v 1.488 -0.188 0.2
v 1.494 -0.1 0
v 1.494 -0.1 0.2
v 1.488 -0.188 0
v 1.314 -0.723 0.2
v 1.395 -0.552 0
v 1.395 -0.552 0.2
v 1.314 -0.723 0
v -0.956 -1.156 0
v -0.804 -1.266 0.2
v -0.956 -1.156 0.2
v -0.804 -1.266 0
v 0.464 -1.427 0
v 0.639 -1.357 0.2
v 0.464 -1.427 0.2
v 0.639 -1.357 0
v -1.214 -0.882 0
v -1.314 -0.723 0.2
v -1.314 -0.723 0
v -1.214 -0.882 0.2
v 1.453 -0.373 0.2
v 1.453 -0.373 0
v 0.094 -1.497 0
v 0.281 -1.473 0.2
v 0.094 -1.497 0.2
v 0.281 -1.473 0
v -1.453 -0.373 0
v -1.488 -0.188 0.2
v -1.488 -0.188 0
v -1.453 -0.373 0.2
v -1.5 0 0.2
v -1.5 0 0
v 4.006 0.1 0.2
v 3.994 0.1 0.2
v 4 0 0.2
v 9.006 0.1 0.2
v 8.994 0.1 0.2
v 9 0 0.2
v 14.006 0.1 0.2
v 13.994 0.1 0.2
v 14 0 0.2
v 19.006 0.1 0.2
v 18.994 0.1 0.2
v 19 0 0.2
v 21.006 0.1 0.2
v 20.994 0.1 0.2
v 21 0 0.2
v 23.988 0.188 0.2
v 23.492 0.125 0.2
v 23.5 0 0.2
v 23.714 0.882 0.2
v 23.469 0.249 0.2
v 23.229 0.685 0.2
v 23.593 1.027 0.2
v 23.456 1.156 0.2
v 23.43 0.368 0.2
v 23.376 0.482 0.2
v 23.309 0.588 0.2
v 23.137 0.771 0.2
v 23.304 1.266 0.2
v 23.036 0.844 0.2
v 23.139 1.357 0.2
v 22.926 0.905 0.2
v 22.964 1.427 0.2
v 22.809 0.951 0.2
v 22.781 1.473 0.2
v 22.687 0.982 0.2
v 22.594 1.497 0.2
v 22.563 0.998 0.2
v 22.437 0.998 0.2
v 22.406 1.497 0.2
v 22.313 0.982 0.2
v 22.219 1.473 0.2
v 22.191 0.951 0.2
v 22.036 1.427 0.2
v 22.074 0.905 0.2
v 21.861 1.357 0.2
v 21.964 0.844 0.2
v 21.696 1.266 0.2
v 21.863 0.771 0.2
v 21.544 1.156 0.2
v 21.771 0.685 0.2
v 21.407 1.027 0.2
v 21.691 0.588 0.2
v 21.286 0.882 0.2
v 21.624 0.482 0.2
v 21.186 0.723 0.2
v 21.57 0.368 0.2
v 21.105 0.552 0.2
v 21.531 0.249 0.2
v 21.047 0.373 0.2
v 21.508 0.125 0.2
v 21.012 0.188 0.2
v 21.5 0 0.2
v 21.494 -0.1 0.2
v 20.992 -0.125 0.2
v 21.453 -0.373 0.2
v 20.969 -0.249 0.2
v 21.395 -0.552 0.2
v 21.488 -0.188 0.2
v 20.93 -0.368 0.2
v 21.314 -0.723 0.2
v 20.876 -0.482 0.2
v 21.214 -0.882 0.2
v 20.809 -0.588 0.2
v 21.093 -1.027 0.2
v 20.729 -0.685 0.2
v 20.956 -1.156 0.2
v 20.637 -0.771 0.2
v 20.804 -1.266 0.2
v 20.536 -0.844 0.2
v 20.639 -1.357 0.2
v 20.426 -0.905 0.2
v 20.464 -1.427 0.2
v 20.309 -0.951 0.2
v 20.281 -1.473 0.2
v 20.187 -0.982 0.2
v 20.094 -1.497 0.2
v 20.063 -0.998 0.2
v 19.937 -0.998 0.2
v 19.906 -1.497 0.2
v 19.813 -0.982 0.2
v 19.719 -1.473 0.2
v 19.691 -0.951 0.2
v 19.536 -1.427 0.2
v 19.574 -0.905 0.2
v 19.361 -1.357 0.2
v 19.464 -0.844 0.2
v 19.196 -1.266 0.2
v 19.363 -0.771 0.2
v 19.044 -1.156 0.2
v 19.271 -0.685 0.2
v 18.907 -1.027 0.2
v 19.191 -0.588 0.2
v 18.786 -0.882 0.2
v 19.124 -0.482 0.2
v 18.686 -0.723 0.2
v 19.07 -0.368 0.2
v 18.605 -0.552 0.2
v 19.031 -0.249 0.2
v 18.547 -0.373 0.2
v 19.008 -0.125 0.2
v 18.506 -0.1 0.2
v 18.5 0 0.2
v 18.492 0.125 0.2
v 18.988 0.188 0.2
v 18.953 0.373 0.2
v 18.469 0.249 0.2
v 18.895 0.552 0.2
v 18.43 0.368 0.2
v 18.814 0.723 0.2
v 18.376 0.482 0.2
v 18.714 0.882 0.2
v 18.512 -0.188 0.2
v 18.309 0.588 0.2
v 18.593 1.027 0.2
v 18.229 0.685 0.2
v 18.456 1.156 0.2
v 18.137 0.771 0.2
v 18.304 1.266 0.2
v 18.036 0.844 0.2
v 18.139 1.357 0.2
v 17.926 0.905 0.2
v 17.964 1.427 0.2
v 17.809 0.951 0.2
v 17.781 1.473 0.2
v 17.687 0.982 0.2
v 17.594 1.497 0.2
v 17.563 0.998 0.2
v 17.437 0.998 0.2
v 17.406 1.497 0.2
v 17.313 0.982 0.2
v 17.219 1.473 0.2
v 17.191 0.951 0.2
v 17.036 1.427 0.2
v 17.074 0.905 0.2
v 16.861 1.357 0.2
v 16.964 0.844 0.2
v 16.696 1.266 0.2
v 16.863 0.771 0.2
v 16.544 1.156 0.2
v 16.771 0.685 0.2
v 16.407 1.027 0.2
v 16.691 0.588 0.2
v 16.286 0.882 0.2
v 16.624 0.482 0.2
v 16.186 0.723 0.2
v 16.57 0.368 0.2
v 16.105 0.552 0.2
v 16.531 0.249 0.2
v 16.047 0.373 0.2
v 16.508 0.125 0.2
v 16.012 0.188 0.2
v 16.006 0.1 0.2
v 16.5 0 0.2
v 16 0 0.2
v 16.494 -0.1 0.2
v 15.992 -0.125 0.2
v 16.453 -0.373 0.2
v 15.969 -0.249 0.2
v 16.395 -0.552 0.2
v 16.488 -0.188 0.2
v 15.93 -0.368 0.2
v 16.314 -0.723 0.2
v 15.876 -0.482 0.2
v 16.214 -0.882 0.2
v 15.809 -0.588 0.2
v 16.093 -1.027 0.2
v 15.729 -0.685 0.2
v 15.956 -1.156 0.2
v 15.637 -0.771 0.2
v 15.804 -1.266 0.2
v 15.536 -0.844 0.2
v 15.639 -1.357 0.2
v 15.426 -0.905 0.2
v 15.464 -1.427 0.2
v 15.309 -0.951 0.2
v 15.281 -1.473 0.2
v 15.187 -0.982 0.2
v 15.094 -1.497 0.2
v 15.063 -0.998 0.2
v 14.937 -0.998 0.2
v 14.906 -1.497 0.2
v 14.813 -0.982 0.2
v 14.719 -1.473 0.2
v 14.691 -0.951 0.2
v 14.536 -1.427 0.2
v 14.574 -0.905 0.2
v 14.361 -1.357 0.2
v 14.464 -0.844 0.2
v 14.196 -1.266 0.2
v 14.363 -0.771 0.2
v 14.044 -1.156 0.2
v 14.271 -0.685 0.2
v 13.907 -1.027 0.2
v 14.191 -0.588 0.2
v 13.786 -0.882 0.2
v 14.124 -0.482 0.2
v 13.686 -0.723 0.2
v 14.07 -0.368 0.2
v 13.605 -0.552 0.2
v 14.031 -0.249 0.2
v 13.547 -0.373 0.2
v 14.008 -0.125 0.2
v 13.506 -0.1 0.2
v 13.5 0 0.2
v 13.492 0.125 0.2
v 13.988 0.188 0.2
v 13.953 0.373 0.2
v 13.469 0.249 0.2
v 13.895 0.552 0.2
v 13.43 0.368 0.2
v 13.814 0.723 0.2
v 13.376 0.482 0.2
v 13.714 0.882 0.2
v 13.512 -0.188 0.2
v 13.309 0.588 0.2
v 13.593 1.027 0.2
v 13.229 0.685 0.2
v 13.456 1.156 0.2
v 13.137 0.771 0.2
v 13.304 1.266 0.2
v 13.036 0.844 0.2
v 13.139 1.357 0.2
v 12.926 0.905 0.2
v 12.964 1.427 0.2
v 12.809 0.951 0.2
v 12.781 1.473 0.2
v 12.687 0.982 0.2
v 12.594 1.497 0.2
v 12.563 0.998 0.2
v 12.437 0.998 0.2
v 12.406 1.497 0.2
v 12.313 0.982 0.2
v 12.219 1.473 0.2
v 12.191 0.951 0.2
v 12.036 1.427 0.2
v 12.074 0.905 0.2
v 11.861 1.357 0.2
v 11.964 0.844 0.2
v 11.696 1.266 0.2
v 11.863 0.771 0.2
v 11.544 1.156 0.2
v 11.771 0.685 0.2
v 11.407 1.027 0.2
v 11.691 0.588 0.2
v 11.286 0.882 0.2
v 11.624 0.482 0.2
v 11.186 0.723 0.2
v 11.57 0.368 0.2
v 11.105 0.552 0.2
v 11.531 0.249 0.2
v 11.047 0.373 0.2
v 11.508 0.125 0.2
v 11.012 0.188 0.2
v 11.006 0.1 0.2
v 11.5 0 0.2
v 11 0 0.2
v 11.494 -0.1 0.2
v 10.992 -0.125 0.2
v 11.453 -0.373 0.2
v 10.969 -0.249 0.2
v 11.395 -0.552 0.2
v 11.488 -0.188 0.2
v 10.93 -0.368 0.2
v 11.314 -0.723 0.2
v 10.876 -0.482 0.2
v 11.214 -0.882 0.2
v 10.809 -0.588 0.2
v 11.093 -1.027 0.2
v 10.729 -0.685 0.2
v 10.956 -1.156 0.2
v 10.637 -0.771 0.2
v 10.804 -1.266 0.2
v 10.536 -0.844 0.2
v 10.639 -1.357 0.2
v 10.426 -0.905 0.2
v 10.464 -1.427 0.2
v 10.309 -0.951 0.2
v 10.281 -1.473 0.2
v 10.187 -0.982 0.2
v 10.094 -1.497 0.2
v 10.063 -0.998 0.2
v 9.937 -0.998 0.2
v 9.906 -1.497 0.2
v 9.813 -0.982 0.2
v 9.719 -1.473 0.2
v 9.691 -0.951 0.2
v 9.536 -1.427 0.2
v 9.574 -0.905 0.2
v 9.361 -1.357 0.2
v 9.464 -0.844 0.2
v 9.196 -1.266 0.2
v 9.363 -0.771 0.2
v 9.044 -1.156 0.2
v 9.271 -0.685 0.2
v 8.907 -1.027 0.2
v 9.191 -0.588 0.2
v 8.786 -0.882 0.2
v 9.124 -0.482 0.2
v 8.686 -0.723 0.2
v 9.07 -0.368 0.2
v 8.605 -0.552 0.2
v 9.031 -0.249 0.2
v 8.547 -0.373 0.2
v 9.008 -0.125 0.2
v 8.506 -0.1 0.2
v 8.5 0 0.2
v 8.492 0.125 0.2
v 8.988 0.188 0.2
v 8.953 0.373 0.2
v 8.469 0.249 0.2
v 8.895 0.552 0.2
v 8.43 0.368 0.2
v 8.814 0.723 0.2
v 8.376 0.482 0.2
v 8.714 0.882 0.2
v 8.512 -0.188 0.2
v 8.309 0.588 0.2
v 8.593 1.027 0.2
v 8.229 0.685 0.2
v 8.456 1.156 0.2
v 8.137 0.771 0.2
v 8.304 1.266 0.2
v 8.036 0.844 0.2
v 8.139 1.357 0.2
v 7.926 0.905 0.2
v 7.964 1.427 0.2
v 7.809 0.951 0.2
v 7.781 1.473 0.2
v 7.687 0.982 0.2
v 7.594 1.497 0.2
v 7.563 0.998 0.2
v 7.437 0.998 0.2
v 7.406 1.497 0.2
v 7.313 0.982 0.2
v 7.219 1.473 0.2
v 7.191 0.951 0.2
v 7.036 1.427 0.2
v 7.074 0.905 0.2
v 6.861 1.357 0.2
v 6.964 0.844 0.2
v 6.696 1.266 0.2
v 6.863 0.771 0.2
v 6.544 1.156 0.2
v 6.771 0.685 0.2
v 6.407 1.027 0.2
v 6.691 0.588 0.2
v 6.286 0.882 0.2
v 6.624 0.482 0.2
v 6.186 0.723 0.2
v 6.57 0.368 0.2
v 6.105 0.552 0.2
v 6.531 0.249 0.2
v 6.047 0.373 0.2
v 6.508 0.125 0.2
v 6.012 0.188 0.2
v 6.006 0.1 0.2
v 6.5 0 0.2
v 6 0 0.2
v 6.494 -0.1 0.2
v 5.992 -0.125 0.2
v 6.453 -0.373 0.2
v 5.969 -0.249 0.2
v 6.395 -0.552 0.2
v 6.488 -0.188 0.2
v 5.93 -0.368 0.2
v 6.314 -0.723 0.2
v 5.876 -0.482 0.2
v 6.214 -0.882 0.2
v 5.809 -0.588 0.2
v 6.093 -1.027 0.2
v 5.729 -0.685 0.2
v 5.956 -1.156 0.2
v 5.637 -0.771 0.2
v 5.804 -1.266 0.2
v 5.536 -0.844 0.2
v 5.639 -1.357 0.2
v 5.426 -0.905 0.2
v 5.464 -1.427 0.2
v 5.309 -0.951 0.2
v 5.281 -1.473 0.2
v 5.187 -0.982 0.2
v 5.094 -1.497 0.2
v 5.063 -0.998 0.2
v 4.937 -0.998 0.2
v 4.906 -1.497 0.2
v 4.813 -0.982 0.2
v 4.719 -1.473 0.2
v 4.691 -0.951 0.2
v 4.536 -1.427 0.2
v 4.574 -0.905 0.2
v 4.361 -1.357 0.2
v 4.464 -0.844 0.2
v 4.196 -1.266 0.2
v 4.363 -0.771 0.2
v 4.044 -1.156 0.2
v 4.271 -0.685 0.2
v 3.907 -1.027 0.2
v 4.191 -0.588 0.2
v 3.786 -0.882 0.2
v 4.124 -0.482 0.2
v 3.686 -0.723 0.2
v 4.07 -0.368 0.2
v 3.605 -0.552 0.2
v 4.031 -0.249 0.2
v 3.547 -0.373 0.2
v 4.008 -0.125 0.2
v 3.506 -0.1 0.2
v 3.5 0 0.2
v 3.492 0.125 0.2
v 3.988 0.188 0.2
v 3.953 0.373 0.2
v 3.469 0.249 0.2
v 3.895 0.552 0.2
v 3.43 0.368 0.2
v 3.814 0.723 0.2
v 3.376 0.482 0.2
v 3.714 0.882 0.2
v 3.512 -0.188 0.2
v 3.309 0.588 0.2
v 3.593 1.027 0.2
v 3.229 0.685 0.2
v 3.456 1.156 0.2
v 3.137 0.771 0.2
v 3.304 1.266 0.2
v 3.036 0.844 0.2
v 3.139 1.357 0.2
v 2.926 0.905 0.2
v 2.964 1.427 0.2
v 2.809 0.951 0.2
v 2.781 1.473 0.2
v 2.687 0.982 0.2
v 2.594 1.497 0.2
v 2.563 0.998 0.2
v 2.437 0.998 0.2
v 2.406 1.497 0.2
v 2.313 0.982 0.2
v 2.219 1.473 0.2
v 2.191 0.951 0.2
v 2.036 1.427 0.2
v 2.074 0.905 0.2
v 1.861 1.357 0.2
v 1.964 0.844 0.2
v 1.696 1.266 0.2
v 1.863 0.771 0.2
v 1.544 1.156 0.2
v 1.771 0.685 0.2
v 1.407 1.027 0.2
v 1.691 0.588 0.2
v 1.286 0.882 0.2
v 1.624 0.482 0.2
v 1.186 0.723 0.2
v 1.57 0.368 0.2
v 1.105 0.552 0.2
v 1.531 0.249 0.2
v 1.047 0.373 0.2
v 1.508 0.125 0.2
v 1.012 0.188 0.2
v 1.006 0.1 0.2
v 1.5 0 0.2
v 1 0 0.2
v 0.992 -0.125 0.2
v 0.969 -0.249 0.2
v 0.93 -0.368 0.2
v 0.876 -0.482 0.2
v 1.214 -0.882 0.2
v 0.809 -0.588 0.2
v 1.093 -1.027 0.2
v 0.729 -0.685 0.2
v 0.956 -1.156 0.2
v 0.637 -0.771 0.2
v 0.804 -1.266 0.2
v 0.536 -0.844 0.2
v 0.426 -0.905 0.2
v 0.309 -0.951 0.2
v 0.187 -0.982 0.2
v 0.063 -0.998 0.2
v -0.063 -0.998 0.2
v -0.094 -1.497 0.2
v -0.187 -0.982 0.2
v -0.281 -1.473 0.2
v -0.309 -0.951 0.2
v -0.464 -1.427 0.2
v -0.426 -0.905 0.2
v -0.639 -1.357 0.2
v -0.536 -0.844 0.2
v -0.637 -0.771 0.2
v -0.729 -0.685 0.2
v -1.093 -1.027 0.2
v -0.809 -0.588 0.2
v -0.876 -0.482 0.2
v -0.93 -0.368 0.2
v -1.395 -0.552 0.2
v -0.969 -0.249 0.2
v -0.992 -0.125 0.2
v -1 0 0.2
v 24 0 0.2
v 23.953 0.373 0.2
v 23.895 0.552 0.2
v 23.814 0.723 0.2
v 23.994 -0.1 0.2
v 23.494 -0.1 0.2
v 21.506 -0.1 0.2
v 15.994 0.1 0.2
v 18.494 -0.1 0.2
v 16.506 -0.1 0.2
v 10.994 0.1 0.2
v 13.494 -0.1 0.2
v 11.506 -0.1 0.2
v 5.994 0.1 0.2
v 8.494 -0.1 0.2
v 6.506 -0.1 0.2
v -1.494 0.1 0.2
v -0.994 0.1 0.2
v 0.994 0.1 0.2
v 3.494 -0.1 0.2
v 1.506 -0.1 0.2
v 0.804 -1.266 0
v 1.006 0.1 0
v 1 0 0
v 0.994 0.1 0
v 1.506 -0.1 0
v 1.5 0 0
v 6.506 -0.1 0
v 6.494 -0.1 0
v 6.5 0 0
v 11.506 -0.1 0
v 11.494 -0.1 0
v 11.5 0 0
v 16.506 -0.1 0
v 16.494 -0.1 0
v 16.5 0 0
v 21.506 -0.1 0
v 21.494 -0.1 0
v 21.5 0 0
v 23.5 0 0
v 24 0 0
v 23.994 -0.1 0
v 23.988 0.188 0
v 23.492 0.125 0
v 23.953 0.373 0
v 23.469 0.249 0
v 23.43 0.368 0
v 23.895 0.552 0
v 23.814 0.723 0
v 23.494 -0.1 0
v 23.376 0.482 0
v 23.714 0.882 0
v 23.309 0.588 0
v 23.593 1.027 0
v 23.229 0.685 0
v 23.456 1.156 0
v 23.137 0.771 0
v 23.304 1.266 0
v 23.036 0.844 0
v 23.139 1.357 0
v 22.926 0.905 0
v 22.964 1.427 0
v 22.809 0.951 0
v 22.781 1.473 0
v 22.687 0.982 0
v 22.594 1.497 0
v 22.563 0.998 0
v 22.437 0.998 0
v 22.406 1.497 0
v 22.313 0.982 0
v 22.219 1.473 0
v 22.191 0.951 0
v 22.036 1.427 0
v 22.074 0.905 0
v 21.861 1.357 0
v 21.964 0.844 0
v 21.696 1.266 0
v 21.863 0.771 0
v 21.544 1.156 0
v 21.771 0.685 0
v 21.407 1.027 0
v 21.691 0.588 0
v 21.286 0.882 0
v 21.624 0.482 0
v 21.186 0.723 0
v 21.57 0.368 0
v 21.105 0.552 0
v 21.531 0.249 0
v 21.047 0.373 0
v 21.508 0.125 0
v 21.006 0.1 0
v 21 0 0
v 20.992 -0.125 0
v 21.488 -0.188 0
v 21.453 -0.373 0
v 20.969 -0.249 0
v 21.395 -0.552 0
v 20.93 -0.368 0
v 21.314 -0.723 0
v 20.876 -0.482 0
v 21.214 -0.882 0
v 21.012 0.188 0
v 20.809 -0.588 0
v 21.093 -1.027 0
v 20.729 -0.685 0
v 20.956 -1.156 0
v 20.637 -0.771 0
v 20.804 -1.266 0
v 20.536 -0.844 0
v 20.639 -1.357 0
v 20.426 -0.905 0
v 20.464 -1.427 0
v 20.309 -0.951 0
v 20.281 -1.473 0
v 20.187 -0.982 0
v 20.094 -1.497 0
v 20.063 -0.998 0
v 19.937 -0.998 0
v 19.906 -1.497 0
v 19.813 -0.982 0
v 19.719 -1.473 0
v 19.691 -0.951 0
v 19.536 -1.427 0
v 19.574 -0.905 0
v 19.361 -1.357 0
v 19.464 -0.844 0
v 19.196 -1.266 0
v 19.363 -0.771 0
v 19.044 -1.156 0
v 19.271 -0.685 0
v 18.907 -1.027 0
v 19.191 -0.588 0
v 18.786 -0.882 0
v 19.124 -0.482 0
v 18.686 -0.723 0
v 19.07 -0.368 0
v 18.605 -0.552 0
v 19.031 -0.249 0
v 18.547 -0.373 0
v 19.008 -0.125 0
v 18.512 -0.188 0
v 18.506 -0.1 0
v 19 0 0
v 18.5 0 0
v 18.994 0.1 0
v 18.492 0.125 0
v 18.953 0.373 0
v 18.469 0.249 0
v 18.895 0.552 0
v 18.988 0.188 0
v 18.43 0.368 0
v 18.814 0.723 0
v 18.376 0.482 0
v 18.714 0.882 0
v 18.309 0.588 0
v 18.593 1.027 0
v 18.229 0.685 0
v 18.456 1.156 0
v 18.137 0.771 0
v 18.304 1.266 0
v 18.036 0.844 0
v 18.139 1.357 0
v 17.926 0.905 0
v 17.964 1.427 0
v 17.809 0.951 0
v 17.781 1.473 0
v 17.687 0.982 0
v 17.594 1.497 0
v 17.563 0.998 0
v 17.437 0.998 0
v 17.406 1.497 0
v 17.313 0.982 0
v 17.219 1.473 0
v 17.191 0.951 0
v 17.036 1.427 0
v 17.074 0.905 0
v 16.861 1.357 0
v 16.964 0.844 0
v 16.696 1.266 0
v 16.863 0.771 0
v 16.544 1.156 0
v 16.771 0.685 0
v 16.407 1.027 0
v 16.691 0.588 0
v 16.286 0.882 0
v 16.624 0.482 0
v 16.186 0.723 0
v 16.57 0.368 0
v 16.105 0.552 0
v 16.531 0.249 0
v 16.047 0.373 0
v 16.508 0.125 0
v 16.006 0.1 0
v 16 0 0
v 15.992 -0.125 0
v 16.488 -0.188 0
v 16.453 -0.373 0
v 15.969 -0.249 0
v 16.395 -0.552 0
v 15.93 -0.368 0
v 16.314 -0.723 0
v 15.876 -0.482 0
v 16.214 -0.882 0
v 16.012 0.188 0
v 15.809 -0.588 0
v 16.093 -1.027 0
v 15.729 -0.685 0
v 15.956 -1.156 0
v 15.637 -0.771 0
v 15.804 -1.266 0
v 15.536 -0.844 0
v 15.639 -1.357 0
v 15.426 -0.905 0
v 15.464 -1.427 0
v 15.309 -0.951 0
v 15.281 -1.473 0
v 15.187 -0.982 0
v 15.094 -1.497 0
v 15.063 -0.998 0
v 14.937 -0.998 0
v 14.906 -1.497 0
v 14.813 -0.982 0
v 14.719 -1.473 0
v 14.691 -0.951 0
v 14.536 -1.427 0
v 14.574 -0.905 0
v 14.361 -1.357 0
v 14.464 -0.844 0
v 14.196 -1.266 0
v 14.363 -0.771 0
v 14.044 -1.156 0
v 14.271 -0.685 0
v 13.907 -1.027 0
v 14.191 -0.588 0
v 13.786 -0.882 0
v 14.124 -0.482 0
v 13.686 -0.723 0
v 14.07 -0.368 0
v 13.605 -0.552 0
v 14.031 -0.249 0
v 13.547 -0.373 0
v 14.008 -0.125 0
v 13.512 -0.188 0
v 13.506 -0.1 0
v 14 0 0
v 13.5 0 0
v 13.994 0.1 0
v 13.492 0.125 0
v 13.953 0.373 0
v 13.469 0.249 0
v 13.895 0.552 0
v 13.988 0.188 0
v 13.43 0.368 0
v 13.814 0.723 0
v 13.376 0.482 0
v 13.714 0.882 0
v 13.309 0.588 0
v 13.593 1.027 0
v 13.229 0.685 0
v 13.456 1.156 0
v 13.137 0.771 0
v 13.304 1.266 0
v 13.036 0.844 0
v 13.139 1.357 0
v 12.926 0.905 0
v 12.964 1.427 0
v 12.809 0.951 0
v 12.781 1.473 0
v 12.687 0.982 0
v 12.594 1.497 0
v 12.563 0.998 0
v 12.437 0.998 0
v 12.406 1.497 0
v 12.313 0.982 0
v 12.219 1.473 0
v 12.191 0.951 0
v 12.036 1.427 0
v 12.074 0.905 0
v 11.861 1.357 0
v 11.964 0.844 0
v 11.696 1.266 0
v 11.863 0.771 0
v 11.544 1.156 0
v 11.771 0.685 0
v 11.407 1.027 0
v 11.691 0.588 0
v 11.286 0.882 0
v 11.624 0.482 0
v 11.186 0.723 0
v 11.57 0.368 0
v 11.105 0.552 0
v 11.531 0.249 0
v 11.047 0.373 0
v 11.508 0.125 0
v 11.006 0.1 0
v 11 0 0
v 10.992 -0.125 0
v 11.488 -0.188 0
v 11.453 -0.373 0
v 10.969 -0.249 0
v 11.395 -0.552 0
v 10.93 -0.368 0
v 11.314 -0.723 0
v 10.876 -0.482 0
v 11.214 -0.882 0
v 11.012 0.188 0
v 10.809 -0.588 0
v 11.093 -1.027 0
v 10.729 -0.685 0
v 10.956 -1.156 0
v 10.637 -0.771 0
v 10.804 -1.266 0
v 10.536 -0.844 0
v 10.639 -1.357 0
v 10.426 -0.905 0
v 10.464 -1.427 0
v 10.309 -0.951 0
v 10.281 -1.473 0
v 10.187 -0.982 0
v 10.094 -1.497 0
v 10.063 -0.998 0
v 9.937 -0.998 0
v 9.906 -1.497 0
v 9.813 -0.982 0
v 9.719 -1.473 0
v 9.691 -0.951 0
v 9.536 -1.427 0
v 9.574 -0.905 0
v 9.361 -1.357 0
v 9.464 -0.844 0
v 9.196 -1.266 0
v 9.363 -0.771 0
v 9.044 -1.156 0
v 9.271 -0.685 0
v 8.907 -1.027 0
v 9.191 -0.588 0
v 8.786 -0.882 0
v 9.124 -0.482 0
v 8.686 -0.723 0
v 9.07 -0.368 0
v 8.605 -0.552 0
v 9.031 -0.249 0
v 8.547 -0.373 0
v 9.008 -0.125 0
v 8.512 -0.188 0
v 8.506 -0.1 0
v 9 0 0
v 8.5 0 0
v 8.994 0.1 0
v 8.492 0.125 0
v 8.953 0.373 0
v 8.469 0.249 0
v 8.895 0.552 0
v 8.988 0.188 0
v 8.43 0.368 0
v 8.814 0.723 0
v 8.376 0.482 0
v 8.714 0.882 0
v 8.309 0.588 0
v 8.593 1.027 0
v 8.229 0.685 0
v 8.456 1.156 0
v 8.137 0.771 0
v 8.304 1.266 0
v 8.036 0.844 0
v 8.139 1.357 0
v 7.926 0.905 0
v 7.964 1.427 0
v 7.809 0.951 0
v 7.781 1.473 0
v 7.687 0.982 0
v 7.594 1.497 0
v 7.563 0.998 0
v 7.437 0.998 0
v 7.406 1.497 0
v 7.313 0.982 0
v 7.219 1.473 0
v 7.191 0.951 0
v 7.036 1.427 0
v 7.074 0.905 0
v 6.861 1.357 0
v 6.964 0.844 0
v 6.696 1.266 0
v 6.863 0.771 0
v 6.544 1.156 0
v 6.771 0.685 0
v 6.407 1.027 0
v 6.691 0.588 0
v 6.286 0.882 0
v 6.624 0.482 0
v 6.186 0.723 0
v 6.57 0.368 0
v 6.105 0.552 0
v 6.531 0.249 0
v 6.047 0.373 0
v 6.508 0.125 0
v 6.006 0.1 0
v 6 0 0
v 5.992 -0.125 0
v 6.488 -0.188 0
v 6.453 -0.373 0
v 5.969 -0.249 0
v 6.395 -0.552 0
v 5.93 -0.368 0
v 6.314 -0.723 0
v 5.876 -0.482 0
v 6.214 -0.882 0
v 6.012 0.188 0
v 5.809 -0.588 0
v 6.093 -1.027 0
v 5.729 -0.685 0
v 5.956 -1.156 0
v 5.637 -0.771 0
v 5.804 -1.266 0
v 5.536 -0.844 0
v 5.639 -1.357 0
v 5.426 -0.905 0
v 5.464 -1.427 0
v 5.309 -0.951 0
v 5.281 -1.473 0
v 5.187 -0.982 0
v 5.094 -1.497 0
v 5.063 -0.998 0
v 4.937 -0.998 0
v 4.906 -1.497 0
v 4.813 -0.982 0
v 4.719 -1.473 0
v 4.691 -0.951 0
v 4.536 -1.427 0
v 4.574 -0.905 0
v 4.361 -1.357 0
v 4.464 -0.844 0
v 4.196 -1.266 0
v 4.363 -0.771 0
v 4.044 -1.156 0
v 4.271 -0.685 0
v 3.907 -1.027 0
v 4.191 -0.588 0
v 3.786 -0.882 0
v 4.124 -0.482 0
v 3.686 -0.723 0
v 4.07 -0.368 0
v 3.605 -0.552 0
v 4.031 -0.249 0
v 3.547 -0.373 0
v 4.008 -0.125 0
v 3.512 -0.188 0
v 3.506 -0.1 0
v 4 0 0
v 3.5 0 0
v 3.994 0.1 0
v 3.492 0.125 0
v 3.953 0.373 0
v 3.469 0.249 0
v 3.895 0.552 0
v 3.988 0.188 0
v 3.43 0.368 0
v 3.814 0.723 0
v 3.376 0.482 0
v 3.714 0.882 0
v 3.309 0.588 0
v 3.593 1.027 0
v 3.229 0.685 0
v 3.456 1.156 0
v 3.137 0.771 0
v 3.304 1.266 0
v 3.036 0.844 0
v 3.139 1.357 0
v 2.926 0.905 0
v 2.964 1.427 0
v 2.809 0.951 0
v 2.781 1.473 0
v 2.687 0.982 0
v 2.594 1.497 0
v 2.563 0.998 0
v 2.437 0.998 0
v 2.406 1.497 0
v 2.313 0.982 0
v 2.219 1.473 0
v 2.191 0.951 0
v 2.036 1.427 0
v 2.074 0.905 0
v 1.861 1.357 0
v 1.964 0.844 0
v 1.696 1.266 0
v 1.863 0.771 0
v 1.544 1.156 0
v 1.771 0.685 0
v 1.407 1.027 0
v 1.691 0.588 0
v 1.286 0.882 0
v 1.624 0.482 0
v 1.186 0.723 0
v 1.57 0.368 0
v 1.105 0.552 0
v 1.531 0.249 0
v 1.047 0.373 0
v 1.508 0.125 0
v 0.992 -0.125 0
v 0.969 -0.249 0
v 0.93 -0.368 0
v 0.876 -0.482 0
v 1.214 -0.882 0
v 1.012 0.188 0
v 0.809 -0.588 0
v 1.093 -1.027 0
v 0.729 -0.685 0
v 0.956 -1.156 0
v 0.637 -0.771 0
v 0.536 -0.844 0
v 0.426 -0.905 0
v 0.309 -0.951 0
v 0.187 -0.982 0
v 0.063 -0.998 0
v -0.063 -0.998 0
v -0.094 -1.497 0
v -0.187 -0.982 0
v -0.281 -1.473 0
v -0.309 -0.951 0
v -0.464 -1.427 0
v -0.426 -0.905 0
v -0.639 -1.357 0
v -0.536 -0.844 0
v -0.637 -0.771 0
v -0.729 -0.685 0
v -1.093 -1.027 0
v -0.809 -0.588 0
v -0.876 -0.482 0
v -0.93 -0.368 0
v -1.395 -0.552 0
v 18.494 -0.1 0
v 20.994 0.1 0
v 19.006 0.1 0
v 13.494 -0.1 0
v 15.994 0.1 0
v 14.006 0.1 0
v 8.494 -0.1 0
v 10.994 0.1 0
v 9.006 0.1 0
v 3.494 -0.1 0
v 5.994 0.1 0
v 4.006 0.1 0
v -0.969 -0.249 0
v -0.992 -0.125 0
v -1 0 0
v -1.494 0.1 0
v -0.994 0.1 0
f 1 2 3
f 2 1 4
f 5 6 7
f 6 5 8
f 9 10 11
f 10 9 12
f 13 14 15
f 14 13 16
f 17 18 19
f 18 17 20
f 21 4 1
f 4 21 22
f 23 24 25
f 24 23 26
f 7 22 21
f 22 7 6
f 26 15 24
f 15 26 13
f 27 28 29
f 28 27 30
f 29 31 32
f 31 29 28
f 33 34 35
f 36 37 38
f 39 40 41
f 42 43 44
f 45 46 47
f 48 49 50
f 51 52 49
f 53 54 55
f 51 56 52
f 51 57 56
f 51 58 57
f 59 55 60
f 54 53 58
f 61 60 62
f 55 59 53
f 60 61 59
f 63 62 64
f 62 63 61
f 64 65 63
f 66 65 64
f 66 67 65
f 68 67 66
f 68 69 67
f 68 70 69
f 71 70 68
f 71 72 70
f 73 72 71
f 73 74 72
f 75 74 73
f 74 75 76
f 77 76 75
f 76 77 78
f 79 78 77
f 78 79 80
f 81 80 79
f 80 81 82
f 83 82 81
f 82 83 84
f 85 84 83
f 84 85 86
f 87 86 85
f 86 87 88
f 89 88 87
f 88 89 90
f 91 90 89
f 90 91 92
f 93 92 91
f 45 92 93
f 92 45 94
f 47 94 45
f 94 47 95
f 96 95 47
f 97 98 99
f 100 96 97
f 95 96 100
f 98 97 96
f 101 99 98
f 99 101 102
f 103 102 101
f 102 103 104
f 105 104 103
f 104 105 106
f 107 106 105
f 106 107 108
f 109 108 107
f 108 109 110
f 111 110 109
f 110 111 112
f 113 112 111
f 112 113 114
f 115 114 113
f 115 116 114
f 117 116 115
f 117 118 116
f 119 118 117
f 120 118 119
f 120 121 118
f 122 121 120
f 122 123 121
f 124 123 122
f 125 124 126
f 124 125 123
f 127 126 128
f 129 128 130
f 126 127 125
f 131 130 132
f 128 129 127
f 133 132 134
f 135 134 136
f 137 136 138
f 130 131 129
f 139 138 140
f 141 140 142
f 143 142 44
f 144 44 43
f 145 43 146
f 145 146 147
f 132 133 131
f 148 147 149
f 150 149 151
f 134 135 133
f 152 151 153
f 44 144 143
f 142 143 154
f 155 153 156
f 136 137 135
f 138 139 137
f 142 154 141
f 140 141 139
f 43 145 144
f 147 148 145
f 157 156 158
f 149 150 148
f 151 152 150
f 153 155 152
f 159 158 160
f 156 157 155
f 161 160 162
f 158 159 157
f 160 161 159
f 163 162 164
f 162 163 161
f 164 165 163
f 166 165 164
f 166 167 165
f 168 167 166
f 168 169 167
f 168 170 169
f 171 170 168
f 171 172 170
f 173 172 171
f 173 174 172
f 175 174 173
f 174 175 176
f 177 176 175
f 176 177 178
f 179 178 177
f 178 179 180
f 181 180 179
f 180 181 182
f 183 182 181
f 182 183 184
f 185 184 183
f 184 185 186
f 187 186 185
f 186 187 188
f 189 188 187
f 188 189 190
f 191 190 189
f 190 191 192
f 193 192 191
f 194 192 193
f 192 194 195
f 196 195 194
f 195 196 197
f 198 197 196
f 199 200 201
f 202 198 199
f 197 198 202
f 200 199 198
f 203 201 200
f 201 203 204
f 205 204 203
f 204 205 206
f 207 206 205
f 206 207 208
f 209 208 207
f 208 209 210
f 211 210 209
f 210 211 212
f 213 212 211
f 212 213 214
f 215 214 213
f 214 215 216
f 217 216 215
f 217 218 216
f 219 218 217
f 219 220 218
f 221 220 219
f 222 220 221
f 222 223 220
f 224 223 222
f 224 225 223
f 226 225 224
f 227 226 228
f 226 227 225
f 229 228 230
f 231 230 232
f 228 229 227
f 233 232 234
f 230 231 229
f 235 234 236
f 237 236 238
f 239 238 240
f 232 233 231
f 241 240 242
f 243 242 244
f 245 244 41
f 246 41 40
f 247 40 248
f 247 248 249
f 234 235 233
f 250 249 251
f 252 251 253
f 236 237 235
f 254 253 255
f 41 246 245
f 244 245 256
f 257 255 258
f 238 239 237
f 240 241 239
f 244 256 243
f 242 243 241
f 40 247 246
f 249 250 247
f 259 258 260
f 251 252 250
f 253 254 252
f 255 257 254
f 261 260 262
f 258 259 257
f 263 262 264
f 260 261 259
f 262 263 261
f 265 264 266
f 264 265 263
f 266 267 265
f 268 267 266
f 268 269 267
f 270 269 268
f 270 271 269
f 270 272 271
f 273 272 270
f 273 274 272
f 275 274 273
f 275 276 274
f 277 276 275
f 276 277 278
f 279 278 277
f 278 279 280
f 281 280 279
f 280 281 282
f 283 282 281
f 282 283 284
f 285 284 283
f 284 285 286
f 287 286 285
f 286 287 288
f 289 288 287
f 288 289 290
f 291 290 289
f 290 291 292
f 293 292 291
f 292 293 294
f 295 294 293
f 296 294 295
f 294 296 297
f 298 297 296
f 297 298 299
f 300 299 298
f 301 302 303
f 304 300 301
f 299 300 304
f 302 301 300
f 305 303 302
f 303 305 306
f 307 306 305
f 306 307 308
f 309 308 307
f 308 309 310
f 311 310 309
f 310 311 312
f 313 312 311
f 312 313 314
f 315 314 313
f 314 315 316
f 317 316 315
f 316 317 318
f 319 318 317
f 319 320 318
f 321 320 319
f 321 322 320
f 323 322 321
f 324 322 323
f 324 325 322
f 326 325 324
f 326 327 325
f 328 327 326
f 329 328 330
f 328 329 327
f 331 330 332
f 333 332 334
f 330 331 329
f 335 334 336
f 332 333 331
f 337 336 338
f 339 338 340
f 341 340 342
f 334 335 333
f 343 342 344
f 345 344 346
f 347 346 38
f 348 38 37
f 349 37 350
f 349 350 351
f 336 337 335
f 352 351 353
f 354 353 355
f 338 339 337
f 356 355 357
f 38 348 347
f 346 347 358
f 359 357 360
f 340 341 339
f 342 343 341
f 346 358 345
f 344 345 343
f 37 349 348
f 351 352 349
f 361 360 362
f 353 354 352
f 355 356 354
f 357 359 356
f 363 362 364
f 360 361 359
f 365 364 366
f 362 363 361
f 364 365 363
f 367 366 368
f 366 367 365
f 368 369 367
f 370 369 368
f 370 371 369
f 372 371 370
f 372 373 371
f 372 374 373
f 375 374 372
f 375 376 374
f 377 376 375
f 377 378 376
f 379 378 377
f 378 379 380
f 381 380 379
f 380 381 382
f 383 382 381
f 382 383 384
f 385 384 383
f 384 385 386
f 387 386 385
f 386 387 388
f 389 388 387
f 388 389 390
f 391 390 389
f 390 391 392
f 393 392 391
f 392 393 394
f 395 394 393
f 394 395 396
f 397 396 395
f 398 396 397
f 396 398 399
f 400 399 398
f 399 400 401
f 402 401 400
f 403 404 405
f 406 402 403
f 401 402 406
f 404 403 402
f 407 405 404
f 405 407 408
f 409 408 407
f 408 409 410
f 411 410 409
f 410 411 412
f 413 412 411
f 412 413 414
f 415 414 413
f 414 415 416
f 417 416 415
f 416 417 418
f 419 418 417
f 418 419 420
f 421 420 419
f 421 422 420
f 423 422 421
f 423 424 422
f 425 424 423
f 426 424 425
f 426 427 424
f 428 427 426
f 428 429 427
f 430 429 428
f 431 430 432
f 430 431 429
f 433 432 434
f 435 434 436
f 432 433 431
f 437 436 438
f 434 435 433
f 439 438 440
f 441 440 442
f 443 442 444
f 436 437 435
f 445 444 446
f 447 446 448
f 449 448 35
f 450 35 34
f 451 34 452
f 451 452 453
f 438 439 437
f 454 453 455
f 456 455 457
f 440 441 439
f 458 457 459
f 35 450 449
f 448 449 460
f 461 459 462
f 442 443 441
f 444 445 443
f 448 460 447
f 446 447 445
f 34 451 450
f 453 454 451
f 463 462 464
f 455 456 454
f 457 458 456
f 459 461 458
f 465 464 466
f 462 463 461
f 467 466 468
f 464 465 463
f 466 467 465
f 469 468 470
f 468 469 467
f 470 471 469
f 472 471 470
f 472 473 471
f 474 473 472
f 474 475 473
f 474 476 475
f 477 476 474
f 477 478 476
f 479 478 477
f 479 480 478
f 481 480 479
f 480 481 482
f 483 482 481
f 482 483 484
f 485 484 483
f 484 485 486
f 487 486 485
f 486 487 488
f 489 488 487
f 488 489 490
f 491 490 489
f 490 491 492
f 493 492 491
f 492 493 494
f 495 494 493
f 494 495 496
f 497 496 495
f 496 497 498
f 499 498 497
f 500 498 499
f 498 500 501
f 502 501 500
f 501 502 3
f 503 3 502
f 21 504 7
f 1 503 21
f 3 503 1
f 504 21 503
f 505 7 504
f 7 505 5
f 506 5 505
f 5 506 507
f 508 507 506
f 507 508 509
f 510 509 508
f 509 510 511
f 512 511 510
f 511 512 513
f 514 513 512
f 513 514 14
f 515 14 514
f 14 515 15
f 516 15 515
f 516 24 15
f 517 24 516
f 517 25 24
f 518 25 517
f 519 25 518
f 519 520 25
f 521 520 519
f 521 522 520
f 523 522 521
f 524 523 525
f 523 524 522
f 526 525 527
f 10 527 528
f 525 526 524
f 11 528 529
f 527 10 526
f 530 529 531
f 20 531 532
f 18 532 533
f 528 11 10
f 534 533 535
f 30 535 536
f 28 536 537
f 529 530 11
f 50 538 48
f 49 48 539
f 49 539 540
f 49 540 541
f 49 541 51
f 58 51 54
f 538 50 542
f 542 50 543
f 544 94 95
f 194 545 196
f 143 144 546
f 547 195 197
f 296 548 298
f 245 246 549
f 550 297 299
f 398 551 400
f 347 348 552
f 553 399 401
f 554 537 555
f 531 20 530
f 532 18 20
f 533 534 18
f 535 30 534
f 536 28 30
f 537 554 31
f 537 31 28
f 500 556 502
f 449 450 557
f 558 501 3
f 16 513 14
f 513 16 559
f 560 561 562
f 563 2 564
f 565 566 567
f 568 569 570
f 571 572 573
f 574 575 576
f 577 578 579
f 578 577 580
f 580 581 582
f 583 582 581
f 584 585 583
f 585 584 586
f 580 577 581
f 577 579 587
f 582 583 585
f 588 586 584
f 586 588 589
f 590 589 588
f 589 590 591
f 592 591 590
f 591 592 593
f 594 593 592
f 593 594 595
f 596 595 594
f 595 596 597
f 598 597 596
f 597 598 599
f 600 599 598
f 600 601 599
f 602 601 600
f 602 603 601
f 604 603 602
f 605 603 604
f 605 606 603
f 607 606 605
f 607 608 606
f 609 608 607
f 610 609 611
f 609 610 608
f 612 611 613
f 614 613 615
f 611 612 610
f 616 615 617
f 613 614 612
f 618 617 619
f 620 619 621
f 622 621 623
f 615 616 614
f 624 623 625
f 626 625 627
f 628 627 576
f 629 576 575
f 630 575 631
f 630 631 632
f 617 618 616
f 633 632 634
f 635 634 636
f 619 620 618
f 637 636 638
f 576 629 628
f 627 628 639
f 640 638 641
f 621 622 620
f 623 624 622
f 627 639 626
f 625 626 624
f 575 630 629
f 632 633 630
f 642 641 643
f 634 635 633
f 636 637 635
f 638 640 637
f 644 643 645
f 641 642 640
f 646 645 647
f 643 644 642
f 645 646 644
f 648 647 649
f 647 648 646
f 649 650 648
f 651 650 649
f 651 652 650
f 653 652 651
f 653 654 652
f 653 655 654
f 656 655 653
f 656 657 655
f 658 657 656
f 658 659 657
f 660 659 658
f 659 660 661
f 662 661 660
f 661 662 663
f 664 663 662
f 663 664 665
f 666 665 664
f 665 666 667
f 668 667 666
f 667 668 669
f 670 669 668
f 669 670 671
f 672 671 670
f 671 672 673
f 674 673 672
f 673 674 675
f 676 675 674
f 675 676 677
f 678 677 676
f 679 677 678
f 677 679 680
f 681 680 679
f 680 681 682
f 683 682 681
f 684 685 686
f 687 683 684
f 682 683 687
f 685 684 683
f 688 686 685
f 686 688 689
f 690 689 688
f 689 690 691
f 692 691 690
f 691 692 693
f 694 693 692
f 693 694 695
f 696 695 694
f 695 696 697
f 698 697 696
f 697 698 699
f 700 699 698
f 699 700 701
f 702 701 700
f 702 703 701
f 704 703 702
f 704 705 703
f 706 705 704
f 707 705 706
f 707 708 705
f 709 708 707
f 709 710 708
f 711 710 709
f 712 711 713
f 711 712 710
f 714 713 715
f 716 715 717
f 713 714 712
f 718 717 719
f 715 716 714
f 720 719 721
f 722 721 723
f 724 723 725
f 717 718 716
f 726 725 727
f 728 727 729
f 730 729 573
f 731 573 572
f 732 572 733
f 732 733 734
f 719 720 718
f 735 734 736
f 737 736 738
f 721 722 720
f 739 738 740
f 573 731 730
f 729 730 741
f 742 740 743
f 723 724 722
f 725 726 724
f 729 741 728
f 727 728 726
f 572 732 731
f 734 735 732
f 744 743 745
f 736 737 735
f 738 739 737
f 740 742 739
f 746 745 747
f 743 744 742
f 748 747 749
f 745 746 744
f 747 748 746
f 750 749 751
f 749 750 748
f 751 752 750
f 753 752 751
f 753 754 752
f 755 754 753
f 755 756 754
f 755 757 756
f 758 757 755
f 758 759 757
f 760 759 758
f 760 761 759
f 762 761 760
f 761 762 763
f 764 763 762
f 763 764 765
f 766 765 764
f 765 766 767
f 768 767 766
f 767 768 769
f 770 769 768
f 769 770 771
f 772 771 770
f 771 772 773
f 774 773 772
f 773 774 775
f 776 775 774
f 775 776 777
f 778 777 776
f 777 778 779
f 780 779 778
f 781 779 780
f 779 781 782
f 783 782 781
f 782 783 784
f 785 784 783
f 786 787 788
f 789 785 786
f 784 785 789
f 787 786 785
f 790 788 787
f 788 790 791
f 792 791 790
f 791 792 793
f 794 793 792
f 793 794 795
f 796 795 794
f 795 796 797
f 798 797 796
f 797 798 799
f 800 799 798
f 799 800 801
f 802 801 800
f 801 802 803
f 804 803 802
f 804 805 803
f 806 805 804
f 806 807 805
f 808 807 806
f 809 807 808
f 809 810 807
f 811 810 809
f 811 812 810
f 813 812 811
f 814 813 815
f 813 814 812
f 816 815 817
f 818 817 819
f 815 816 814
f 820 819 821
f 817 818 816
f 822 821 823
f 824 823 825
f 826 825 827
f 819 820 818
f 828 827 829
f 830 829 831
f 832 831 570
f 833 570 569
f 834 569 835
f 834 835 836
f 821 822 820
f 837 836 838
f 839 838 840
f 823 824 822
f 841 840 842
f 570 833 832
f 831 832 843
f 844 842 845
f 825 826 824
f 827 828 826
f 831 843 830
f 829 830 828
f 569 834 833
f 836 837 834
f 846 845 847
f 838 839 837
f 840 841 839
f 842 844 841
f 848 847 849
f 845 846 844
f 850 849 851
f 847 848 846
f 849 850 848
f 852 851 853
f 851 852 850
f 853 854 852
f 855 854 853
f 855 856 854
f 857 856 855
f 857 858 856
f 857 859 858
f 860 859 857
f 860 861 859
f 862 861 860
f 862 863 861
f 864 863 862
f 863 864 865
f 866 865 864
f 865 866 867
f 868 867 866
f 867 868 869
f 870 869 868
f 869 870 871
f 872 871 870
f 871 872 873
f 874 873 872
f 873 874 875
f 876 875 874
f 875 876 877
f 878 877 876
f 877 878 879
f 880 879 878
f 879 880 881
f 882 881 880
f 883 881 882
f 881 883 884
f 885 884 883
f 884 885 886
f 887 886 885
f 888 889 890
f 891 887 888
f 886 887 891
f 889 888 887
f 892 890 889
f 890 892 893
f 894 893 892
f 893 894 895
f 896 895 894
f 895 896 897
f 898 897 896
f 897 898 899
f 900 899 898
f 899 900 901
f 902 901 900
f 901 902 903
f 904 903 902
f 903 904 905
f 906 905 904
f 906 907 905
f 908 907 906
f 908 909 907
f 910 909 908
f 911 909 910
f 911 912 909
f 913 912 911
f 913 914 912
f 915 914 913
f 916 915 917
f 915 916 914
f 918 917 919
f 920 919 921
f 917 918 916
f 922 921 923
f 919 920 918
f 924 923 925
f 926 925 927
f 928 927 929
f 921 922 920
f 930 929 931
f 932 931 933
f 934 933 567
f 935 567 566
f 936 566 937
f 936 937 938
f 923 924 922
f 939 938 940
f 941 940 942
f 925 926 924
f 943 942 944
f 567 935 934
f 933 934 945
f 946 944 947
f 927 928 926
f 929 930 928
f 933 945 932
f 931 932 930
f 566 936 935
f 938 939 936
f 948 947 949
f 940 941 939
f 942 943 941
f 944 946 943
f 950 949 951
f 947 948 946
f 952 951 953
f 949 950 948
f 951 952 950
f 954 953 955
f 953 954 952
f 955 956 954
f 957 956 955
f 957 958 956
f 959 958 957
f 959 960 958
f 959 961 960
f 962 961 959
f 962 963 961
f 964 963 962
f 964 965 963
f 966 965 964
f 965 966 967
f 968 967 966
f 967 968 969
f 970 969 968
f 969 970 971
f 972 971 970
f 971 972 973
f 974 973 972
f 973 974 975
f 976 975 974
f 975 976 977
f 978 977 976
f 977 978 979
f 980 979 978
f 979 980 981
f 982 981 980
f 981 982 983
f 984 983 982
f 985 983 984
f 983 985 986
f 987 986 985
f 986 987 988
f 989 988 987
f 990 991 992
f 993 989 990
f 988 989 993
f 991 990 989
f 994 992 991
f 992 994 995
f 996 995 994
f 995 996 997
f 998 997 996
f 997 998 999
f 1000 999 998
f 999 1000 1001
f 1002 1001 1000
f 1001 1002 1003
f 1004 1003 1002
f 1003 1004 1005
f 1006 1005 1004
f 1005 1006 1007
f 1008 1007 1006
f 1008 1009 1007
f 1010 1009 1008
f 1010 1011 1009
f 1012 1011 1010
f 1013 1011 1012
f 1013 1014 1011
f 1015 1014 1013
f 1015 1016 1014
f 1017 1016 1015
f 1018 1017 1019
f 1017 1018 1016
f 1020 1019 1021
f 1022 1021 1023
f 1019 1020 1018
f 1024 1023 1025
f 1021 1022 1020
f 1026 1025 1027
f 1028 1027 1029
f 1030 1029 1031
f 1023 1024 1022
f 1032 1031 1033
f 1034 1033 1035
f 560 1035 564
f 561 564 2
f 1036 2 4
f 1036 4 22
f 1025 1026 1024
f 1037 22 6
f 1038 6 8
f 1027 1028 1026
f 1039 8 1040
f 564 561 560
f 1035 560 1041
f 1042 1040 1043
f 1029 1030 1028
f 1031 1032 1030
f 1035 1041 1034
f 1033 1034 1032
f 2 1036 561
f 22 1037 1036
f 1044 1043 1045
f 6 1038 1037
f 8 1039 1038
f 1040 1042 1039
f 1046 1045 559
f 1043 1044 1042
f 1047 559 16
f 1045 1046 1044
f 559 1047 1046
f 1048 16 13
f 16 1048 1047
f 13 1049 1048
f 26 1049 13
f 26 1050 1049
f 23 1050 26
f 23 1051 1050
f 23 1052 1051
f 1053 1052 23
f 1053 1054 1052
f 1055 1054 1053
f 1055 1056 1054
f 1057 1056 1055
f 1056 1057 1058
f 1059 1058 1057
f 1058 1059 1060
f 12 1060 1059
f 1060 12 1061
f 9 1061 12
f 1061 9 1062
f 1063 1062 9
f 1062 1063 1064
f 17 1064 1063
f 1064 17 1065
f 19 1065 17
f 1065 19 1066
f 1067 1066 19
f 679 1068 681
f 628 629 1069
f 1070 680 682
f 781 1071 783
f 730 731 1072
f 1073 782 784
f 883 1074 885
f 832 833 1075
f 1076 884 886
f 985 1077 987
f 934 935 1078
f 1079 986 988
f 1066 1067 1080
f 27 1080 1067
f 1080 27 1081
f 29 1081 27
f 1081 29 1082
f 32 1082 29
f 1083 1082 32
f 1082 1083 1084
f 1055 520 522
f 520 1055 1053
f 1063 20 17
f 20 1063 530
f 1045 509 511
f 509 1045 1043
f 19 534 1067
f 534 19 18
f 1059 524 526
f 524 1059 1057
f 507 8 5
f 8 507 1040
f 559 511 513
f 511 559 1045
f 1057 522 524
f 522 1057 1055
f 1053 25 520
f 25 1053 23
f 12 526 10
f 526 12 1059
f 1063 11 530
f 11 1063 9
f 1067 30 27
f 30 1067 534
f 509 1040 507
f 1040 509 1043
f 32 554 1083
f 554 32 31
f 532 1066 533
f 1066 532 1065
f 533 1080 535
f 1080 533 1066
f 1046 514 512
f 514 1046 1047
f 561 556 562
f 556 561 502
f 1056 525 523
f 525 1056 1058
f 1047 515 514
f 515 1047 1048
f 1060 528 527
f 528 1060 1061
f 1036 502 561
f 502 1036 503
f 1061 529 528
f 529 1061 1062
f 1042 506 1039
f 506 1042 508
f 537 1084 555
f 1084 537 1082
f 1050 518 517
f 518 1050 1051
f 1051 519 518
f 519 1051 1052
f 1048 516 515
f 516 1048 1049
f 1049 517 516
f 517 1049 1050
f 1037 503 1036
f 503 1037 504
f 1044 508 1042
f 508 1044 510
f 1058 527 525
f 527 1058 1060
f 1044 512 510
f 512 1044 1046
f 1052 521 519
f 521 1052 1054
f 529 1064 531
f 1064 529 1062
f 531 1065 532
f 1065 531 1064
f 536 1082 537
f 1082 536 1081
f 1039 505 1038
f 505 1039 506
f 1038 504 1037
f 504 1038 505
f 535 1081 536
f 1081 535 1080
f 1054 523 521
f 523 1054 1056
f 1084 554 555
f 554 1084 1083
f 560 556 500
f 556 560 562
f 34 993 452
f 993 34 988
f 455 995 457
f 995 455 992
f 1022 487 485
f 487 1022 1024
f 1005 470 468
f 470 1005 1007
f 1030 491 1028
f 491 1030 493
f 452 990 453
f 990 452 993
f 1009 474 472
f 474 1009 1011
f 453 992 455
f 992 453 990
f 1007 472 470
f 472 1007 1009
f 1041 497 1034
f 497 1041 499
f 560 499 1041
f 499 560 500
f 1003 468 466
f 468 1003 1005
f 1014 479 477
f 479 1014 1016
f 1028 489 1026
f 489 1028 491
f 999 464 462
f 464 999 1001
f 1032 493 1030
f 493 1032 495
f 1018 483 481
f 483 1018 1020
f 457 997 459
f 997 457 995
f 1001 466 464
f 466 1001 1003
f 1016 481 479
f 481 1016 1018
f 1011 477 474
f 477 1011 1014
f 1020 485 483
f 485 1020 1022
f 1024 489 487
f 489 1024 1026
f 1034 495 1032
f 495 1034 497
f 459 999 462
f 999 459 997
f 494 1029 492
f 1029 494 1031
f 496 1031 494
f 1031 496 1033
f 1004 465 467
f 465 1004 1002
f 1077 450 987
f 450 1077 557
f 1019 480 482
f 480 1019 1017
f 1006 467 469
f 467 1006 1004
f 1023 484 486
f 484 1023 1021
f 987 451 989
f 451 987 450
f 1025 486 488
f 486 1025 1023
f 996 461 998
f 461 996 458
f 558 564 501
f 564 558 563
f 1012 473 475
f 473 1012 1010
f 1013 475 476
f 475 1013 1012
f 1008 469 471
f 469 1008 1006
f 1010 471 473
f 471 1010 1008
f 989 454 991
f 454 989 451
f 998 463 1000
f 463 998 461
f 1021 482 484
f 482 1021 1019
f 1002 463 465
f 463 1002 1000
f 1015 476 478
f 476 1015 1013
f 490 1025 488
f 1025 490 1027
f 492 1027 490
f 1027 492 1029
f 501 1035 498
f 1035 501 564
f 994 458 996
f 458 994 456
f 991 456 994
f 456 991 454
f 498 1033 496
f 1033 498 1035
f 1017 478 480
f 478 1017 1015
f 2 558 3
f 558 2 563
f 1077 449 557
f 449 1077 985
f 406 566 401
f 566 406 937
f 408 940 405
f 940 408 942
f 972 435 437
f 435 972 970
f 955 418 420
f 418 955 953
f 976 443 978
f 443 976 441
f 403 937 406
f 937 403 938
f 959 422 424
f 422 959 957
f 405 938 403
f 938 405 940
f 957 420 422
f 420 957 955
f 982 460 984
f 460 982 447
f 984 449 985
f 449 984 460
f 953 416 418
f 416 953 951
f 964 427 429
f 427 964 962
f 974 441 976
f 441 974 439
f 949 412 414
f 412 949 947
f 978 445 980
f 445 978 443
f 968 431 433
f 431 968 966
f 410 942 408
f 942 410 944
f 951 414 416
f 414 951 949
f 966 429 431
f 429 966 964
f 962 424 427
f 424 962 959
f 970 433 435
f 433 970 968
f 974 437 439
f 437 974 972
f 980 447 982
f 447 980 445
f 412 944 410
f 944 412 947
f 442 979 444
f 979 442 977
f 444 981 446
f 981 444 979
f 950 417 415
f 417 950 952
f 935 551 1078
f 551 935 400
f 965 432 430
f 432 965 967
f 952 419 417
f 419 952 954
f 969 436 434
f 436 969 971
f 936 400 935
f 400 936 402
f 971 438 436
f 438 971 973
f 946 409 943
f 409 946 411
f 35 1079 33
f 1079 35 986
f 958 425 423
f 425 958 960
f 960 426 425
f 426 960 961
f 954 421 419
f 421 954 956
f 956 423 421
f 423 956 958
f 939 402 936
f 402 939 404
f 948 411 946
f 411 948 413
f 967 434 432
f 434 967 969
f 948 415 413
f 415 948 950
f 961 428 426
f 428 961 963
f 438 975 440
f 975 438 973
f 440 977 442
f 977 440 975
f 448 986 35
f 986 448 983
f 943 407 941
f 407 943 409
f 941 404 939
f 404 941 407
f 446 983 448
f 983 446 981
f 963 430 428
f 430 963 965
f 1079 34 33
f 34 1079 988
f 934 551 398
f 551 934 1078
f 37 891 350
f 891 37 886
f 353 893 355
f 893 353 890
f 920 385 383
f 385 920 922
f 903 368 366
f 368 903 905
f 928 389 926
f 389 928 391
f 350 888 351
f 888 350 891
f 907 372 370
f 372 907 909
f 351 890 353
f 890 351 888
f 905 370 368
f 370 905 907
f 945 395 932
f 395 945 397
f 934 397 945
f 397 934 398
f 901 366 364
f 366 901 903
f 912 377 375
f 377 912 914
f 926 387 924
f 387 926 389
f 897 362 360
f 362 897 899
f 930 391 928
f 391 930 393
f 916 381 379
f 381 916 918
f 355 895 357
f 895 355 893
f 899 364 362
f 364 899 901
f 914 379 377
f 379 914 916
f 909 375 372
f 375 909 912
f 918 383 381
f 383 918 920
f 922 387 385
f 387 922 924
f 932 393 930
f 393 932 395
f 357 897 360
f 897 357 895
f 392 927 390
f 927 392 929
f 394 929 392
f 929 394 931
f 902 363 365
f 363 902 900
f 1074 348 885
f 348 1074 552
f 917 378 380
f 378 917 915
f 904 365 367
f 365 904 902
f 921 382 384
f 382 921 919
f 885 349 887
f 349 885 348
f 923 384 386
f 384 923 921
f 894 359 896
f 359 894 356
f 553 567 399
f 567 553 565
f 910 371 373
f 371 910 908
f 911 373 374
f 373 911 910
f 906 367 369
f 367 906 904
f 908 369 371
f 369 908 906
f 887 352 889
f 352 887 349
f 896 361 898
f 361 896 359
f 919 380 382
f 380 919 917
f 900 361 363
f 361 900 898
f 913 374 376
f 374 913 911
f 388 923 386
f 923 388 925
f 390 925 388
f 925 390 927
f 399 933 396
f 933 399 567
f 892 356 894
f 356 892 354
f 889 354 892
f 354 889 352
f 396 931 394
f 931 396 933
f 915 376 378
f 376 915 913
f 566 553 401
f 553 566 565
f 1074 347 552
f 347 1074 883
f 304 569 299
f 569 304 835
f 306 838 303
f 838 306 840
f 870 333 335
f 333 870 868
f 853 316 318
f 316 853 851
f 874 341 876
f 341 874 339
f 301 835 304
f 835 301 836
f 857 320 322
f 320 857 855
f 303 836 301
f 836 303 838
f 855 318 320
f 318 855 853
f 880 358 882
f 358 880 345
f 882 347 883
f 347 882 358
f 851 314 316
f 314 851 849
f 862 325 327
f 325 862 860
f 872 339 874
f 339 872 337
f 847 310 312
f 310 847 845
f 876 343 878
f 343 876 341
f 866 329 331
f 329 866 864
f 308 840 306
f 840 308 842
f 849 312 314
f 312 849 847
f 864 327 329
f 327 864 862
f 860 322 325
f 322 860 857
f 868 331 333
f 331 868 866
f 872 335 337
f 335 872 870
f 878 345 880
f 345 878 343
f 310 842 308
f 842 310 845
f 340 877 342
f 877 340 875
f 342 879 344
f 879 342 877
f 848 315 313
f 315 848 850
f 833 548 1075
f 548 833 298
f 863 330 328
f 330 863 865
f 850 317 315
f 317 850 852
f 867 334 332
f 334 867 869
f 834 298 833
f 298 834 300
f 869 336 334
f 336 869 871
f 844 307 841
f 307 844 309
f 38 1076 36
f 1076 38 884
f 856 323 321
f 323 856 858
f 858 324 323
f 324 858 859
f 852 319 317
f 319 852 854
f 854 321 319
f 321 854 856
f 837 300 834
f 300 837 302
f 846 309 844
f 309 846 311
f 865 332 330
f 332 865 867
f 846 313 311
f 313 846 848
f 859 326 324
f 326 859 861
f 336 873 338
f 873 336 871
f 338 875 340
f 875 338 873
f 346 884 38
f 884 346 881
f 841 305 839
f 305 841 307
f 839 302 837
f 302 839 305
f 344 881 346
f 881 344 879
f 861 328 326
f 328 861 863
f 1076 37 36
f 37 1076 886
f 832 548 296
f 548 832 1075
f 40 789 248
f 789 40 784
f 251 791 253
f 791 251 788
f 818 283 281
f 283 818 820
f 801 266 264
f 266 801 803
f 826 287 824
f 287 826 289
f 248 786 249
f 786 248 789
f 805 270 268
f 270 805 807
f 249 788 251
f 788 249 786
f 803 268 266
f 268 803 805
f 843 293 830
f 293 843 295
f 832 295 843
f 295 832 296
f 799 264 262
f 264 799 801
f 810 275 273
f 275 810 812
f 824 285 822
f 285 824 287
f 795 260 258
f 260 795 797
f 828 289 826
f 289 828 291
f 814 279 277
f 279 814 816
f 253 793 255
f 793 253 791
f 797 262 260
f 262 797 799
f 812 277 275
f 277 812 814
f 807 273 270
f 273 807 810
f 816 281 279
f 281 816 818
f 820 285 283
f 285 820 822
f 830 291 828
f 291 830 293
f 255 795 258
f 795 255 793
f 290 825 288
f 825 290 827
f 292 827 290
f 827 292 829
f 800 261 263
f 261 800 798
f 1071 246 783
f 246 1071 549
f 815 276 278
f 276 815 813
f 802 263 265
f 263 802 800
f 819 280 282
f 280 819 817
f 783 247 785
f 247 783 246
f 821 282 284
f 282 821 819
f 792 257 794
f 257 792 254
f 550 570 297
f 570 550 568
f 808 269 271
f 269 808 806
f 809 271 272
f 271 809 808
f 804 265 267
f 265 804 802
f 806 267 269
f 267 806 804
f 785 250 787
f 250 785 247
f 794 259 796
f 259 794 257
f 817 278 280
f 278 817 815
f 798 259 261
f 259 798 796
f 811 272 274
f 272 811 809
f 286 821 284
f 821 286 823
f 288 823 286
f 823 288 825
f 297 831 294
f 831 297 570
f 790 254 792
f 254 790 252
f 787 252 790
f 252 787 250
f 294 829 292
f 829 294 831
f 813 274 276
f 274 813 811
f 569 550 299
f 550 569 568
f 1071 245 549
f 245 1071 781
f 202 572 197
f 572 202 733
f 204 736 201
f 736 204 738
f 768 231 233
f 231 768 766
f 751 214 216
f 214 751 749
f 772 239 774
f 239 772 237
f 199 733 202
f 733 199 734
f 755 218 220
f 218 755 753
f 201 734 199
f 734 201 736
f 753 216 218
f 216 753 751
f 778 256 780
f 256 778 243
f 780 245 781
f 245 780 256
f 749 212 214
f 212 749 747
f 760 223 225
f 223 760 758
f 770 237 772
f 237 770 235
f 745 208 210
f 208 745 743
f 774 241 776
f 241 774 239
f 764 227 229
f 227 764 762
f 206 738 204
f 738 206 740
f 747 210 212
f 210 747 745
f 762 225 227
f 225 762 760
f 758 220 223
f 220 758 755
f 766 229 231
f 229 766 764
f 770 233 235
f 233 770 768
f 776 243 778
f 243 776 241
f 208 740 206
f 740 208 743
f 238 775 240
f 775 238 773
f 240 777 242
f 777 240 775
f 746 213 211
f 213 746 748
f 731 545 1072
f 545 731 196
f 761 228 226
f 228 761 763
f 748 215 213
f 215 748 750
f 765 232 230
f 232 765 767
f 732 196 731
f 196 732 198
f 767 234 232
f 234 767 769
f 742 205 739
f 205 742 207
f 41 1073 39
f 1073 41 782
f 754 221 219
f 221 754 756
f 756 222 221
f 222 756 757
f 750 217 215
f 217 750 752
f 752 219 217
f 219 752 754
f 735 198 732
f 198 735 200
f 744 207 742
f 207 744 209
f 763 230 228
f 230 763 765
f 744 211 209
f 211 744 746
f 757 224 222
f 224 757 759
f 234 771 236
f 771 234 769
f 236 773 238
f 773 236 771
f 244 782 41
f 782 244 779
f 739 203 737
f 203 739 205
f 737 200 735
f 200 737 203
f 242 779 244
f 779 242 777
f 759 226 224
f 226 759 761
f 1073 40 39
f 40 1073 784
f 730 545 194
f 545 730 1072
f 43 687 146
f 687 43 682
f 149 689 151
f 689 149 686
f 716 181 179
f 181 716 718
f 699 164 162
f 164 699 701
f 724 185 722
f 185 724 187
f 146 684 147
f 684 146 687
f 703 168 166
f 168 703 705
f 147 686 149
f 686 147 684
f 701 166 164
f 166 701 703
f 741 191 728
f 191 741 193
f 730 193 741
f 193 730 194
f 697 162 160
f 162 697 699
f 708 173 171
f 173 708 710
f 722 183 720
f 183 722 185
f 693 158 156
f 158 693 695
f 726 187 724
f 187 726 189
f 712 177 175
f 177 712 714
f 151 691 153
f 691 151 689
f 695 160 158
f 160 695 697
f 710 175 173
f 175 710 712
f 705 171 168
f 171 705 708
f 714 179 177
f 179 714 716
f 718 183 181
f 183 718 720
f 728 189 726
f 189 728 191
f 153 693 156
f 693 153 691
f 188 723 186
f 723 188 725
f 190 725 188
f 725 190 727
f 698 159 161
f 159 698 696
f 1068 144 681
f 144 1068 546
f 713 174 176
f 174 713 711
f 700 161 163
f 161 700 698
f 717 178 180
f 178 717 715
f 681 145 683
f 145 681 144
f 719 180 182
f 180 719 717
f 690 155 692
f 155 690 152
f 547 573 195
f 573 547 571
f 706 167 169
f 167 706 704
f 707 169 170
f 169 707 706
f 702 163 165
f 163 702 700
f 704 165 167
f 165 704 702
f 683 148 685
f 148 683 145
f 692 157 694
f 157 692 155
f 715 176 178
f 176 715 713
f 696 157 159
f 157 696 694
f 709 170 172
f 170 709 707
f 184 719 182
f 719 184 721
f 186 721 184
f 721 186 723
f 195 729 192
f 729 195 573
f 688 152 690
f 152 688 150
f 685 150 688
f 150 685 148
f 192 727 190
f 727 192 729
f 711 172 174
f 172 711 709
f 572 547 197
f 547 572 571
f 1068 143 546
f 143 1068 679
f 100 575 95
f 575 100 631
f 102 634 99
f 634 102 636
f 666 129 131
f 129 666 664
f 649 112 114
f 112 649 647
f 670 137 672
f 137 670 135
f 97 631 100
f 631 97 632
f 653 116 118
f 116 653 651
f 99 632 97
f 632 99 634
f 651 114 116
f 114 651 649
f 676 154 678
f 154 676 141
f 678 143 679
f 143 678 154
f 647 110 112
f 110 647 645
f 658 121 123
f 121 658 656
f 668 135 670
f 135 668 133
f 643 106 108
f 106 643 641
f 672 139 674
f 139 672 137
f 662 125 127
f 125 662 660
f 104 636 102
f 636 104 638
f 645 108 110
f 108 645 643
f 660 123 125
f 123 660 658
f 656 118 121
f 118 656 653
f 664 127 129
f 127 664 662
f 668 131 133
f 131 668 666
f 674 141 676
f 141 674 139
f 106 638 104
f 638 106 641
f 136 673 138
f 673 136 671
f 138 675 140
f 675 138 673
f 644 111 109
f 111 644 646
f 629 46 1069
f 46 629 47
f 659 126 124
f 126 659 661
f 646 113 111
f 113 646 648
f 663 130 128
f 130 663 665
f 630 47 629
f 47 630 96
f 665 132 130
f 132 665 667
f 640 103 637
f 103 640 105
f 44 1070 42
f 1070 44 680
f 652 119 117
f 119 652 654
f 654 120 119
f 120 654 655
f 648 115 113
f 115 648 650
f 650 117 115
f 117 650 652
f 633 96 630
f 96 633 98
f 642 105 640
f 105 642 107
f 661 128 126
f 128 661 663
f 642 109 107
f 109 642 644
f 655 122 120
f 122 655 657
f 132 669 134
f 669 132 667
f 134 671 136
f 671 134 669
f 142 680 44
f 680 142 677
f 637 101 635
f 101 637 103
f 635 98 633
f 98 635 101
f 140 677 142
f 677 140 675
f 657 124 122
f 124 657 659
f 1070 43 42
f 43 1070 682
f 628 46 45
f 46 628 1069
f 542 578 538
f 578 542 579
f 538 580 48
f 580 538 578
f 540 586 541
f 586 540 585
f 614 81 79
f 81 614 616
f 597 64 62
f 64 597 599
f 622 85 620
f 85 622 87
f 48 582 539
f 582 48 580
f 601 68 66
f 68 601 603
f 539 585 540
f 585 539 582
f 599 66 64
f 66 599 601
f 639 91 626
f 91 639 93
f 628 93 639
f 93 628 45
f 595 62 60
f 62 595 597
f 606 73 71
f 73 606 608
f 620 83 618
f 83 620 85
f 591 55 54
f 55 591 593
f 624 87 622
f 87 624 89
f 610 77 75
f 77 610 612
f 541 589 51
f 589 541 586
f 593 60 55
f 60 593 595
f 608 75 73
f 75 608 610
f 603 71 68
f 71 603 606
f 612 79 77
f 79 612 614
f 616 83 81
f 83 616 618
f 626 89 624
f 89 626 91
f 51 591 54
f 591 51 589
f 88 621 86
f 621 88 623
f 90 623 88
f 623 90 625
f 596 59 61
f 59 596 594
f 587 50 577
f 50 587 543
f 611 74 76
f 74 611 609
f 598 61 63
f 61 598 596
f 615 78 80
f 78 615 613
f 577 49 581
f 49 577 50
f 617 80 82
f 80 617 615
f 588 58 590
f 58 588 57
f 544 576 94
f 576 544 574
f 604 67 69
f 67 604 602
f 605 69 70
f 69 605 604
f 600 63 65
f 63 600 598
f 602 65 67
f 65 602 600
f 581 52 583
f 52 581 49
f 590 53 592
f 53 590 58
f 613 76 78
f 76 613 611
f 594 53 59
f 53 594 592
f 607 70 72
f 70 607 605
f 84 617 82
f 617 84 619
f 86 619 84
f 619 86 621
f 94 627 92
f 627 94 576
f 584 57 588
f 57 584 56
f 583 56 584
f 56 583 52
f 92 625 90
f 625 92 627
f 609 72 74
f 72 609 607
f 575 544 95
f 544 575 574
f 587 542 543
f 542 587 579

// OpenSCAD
$fn =50;

module simi_c(w,t,h){
difference(){
    cylinder(h =h,r=w/2);
    translate([0,0,-0.5])cylinder(h =h+1,r=w/2-t);
    translate([-w/2,0+0.1,-0.5])cube([w,w/2,h+1]);
        }
    }
module spring(w,t,h,n)
{
    
    for(i = [0:n-1])
    {
translate([(w-t)*i,0,0])mirror([0,i%2,0])simi_c(w,t,h);        
        
        
        }
    }


spring(3,0.5,0.2,10);
